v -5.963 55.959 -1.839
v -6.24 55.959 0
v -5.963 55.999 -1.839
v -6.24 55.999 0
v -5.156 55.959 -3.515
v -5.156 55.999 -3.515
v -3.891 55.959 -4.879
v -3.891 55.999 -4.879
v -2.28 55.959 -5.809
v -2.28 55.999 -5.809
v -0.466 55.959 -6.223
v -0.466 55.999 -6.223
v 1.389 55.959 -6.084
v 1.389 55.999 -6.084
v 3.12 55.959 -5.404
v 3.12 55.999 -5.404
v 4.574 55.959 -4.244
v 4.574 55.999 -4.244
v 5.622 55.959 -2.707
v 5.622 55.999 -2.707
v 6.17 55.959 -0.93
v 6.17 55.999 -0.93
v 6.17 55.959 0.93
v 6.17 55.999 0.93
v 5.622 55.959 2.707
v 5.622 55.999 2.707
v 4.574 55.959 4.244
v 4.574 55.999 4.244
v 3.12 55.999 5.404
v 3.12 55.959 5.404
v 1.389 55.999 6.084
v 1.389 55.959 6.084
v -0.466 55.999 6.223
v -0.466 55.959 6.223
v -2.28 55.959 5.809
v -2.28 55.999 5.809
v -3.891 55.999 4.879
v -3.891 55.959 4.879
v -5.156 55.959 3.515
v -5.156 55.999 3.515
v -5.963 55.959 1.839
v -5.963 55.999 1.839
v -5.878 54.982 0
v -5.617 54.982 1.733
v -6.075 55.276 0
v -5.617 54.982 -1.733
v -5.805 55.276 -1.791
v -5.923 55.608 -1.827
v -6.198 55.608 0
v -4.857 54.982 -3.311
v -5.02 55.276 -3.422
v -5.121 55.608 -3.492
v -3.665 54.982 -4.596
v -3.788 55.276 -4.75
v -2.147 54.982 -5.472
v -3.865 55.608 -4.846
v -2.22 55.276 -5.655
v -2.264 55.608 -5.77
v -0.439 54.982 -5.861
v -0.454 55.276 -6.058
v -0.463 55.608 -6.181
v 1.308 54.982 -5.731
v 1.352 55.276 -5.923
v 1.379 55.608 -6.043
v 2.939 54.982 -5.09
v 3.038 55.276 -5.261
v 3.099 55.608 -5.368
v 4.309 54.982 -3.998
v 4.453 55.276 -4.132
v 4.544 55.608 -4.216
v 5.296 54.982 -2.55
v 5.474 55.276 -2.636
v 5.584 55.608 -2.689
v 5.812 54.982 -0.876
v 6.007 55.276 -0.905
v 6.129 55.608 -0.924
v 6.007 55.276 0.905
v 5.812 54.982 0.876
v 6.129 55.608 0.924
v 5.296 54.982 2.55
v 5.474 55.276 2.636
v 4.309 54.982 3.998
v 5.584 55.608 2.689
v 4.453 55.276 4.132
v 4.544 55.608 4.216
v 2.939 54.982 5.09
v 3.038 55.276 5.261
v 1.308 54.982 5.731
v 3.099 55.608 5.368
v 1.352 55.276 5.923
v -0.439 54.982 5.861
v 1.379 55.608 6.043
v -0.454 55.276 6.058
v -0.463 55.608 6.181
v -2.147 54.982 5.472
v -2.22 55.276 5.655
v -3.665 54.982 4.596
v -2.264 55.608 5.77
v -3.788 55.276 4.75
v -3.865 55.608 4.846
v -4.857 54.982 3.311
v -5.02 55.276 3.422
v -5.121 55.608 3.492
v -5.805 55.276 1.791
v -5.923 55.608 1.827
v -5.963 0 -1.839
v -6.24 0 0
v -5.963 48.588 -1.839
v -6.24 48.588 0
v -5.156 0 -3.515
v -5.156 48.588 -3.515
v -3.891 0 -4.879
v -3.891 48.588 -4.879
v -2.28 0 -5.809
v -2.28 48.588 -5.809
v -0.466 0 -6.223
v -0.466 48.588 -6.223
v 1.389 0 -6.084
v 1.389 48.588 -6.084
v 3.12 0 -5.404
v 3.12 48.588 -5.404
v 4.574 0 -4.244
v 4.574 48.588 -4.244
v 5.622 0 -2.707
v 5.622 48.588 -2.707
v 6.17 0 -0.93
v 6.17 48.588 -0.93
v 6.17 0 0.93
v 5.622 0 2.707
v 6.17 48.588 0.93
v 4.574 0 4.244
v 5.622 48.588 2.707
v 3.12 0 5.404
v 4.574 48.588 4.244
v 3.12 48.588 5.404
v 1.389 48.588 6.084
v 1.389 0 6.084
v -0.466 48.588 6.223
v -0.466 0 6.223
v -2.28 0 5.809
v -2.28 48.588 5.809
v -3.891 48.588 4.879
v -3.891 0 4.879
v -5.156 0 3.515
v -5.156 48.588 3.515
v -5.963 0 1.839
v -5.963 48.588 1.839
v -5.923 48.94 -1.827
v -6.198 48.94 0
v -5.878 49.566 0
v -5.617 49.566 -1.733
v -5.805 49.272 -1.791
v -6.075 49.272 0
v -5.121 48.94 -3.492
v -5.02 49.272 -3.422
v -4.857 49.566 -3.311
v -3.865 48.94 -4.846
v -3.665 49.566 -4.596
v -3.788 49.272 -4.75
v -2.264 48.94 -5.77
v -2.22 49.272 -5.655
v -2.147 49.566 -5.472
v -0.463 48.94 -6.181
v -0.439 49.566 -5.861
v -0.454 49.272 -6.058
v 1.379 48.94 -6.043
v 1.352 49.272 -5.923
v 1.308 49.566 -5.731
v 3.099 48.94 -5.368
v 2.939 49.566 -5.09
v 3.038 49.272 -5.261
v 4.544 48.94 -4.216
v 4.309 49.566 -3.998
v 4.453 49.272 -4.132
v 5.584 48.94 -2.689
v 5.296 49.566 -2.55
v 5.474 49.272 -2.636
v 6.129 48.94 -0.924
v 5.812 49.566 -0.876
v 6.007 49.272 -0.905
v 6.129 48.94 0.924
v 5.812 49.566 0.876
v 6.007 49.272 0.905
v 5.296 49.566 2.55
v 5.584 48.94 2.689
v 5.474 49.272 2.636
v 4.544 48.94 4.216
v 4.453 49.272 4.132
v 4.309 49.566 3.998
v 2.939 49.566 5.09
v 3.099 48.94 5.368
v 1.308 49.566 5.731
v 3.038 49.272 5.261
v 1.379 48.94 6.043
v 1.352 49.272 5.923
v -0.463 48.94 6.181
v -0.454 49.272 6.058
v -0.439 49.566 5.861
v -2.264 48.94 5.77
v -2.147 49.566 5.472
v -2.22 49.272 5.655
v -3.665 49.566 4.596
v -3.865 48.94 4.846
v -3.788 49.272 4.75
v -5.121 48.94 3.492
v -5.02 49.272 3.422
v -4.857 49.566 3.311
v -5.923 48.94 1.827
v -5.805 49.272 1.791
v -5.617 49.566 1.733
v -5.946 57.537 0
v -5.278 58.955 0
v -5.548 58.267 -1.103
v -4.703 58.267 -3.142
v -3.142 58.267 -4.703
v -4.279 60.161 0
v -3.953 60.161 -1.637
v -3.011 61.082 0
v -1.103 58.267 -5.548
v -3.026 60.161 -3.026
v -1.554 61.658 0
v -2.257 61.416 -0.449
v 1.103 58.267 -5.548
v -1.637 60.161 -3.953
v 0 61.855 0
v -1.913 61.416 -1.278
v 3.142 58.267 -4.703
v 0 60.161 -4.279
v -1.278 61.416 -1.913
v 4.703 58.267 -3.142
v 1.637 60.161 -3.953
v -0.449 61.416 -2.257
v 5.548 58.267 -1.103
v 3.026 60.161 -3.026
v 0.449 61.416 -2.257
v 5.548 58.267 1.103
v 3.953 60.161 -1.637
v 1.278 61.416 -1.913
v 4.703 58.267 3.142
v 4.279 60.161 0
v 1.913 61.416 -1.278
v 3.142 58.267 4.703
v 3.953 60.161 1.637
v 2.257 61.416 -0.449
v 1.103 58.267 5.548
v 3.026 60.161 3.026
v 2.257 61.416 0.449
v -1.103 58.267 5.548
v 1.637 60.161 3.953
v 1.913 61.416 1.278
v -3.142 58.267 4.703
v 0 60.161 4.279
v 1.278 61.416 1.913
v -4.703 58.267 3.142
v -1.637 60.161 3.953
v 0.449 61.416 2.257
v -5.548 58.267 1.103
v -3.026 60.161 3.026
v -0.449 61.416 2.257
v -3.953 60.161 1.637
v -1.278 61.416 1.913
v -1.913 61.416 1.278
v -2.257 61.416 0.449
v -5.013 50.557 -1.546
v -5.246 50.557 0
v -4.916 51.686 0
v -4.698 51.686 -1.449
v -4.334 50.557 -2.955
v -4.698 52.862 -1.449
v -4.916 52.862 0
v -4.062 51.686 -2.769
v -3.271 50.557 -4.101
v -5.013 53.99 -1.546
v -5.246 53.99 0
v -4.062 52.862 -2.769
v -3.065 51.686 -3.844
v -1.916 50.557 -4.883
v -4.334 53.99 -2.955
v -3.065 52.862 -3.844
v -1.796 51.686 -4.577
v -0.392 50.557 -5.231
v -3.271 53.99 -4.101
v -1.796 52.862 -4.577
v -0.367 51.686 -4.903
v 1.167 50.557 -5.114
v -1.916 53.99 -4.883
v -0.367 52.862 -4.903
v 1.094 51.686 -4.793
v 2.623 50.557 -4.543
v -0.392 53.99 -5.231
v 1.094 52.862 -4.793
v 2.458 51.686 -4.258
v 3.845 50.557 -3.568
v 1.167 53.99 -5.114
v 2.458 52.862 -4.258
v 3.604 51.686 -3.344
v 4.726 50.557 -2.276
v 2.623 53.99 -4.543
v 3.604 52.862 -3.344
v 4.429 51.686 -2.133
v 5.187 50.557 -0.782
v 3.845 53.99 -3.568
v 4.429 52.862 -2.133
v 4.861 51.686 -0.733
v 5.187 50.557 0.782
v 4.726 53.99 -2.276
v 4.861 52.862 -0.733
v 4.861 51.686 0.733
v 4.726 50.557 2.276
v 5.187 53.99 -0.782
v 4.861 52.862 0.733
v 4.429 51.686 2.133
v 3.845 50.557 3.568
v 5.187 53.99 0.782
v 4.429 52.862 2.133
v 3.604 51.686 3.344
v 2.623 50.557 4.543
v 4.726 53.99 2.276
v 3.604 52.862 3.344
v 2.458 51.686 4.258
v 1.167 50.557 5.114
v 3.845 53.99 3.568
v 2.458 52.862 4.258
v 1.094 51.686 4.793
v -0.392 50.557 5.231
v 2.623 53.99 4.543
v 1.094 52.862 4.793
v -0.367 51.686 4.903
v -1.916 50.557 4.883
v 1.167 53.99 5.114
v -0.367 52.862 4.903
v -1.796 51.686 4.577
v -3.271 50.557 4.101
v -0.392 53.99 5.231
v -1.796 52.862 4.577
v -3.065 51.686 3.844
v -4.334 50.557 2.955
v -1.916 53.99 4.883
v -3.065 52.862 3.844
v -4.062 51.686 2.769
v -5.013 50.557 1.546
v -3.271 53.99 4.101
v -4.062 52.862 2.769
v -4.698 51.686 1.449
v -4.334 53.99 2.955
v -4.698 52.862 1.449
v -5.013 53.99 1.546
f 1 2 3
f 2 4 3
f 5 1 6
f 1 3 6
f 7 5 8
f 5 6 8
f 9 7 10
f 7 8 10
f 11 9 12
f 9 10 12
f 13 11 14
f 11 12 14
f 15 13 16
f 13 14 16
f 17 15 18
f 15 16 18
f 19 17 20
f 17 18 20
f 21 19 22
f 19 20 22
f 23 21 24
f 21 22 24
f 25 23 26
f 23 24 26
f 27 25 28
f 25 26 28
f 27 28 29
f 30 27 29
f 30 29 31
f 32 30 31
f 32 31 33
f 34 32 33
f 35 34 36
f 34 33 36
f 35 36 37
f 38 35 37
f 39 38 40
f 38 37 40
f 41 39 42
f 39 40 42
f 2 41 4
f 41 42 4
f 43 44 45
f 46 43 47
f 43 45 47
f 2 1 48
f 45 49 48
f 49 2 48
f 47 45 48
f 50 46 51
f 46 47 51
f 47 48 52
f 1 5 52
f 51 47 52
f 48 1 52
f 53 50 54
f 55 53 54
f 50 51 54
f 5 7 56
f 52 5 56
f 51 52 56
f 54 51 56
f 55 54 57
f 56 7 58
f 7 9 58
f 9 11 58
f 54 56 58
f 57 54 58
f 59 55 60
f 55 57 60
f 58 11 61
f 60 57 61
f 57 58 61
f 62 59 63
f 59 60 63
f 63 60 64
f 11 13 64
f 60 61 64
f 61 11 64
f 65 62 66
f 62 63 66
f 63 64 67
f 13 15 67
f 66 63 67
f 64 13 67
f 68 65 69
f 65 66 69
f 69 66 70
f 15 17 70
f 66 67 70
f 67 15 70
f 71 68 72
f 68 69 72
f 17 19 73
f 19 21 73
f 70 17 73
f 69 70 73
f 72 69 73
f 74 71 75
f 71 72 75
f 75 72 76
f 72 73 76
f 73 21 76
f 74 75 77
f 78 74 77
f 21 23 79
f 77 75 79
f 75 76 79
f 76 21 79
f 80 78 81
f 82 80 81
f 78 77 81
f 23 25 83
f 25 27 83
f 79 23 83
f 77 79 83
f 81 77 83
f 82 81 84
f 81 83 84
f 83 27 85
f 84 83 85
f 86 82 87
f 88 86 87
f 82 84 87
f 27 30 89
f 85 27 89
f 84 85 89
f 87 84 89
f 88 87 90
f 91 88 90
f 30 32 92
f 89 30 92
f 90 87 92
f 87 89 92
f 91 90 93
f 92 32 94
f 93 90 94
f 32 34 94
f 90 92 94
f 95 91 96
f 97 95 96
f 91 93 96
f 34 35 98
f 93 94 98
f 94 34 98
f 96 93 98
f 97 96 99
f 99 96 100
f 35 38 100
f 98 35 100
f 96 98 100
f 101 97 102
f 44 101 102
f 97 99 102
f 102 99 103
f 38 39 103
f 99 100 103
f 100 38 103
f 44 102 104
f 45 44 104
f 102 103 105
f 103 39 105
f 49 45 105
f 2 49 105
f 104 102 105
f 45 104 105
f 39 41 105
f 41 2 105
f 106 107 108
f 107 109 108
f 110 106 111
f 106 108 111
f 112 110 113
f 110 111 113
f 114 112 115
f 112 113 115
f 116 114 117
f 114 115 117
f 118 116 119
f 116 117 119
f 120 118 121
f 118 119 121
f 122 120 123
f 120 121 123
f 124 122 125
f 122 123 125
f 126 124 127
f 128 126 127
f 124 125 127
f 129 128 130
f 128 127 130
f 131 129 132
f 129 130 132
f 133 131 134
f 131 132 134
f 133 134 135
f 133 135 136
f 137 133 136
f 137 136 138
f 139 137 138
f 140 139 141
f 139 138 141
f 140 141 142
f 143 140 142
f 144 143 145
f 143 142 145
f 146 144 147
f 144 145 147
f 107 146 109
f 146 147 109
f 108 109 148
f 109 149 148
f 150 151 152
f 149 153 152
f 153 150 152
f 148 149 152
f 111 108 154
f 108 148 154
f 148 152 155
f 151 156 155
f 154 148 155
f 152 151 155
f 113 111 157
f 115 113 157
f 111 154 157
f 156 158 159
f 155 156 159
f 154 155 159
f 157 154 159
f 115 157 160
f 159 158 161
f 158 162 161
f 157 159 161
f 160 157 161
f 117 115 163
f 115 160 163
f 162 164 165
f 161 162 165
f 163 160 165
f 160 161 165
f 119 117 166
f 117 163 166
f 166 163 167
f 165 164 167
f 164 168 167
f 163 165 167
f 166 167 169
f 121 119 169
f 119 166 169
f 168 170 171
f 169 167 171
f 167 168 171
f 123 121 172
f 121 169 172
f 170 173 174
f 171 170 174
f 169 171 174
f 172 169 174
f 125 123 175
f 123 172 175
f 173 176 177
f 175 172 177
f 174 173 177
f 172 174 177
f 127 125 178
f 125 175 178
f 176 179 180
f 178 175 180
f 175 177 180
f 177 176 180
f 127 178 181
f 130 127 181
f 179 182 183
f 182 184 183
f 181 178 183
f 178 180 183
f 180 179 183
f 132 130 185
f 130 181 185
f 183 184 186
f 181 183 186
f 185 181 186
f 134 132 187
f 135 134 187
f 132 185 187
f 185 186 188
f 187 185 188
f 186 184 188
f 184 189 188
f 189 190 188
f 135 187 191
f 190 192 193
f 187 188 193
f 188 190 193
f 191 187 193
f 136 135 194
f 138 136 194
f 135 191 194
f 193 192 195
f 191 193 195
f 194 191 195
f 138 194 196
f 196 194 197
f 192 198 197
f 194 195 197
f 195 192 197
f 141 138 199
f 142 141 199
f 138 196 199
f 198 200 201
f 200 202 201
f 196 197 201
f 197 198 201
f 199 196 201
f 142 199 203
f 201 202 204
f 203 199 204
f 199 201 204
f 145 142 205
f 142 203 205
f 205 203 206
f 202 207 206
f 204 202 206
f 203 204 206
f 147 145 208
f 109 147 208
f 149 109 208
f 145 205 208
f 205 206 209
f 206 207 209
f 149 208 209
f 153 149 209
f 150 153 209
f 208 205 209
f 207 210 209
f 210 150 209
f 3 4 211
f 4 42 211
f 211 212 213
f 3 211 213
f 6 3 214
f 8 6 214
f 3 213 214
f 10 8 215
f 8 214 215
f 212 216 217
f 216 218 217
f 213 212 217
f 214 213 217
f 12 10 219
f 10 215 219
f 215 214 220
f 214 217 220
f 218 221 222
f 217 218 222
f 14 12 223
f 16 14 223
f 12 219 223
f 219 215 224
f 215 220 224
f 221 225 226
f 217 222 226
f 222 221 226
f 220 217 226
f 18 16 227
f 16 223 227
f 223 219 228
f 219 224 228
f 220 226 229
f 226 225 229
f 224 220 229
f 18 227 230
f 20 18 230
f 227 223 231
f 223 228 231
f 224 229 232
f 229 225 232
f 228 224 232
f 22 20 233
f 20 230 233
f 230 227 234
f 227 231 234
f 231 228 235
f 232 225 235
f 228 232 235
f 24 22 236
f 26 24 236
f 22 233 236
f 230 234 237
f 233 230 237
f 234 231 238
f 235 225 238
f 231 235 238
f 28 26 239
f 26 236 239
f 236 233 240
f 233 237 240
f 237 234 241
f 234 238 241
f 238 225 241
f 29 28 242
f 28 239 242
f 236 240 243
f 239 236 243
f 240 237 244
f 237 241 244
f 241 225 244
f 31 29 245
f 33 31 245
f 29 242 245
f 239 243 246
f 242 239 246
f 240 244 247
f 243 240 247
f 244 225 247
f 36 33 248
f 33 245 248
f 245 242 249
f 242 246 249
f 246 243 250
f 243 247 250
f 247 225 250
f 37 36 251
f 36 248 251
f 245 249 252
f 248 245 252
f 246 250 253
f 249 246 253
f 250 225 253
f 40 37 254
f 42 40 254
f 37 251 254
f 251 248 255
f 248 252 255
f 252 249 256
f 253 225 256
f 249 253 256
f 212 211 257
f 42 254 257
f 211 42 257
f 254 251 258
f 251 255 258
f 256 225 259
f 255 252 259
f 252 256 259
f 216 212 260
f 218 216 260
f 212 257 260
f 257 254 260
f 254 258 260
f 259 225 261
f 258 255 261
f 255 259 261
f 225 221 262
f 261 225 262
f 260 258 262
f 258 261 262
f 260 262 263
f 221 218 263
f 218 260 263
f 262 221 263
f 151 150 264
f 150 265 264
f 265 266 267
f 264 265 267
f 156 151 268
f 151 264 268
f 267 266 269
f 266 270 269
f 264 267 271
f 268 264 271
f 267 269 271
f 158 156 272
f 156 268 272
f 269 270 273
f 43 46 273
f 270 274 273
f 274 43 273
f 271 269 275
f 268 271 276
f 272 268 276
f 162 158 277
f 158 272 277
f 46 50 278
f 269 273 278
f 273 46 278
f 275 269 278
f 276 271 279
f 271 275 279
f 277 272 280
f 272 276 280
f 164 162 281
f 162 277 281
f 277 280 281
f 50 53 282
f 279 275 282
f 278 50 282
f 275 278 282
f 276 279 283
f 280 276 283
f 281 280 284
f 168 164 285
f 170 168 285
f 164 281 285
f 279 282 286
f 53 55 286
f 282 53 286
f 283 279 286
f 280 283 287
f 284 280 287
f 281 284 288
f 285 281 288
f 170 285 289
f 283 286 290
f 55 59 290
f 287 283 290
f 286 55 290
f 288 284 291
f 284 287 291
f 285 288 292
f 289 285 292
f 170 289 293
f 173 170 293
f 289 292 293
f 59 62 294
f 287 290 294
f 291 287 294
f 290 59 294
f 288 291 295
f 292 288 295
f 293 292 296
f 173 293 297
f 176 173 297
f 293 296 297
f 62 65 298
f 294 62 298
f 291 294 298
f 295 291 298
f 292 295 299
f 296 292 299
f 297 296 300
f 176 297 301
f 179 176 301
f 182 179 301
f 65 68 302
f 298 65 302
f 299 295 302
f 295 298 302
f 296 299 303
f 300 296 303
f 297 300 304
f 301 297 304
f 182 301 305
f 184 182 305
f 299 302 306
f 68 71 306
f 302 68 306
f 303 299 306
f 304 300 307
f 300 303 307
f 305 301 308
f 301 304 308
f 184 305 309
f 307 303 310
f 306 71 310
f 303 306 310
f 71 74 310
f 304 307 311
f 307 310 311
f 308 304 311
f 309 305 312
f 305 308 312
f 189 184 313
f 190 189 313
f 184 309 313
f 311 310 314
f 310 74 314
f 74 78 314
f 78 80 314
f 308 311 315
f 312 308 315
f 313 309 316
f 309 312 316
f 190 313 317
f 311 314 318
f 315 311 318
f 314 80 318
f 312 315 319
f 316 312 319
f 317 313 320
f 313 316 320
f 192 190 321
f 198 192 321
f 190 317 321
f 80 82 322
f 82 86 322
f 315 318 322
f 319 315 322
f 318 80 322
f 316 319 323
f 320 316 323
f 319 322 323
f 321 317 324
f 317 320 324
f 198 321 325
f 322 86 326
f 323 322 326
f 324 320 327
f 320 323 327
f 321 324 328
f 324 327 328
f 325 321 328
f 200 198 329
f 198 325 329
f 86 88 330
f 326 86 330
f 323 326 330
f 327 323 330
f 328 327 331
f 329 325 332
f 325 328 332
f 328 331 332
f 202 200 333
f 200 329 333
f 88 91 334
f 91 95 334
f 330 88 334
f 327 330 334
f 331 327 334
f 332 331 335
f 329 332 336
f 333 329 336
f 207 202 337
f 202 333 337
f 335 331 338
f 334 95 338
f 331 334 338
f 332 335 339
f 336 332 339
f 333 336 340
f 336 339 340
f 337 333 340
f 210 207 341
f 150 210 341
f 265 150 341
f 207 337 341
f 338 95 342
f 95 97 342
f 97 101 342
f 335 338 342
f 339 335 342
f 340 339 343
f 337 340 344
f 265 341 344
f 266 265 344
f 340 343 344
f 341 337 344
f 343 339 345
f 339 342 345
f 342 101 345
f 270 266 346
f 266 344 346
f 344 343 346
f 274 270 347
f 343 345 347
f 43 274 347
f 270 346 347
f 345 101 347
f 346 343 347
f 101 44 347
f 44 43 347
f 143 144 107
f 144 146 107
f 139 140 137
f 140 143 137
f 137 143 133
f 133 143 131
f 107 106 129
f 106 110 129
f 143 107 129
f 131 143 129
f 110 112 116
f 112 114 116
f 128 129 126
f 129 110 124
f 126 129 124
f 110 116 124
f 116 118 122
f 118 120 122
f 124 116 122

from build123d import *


with BuildPart() as part:
    # Sketch2 → Revolve1 (revolve)
    with BuildSketch(Plane.XY, mode=Mode.PRIVATE) as revolve1_sk:
        with BuildLine():
            Line((0, 0), (6.24, 0))
            Line((6.24, 0), (6.24, 48.588483168))
            ThreePointArc((6.24, 48.588483168), (6.146561159, 49.109622023), (5.877885725, 49.565834731))
            ThreePointArc((5.877885725, 49.565834731), (4.874570596, 52.273796489), (5.877885725, 54.981758248))
            ThreePointArc((5.877885725, 54.981758248), (6.146561159, 55.437970955), (6.24, 55.95910981))
            Line((6.24, 55.95910981), (6.24, 55.998530254))
            ThreePointArc((6.24, 55.998530254), (4.278763618, 60.161301491), (0, 61.854610207))
            Line((0, 61.854610207), (0, 0))
        make_face()
    revolve(revolve1_sk.sketch.rotate(Axis((0, 61.854610207, 0), (0, -1, 0)), 180), axis=Axis((0, 61.854610207, 0), (0, -1, 0)))


solid = part.part
